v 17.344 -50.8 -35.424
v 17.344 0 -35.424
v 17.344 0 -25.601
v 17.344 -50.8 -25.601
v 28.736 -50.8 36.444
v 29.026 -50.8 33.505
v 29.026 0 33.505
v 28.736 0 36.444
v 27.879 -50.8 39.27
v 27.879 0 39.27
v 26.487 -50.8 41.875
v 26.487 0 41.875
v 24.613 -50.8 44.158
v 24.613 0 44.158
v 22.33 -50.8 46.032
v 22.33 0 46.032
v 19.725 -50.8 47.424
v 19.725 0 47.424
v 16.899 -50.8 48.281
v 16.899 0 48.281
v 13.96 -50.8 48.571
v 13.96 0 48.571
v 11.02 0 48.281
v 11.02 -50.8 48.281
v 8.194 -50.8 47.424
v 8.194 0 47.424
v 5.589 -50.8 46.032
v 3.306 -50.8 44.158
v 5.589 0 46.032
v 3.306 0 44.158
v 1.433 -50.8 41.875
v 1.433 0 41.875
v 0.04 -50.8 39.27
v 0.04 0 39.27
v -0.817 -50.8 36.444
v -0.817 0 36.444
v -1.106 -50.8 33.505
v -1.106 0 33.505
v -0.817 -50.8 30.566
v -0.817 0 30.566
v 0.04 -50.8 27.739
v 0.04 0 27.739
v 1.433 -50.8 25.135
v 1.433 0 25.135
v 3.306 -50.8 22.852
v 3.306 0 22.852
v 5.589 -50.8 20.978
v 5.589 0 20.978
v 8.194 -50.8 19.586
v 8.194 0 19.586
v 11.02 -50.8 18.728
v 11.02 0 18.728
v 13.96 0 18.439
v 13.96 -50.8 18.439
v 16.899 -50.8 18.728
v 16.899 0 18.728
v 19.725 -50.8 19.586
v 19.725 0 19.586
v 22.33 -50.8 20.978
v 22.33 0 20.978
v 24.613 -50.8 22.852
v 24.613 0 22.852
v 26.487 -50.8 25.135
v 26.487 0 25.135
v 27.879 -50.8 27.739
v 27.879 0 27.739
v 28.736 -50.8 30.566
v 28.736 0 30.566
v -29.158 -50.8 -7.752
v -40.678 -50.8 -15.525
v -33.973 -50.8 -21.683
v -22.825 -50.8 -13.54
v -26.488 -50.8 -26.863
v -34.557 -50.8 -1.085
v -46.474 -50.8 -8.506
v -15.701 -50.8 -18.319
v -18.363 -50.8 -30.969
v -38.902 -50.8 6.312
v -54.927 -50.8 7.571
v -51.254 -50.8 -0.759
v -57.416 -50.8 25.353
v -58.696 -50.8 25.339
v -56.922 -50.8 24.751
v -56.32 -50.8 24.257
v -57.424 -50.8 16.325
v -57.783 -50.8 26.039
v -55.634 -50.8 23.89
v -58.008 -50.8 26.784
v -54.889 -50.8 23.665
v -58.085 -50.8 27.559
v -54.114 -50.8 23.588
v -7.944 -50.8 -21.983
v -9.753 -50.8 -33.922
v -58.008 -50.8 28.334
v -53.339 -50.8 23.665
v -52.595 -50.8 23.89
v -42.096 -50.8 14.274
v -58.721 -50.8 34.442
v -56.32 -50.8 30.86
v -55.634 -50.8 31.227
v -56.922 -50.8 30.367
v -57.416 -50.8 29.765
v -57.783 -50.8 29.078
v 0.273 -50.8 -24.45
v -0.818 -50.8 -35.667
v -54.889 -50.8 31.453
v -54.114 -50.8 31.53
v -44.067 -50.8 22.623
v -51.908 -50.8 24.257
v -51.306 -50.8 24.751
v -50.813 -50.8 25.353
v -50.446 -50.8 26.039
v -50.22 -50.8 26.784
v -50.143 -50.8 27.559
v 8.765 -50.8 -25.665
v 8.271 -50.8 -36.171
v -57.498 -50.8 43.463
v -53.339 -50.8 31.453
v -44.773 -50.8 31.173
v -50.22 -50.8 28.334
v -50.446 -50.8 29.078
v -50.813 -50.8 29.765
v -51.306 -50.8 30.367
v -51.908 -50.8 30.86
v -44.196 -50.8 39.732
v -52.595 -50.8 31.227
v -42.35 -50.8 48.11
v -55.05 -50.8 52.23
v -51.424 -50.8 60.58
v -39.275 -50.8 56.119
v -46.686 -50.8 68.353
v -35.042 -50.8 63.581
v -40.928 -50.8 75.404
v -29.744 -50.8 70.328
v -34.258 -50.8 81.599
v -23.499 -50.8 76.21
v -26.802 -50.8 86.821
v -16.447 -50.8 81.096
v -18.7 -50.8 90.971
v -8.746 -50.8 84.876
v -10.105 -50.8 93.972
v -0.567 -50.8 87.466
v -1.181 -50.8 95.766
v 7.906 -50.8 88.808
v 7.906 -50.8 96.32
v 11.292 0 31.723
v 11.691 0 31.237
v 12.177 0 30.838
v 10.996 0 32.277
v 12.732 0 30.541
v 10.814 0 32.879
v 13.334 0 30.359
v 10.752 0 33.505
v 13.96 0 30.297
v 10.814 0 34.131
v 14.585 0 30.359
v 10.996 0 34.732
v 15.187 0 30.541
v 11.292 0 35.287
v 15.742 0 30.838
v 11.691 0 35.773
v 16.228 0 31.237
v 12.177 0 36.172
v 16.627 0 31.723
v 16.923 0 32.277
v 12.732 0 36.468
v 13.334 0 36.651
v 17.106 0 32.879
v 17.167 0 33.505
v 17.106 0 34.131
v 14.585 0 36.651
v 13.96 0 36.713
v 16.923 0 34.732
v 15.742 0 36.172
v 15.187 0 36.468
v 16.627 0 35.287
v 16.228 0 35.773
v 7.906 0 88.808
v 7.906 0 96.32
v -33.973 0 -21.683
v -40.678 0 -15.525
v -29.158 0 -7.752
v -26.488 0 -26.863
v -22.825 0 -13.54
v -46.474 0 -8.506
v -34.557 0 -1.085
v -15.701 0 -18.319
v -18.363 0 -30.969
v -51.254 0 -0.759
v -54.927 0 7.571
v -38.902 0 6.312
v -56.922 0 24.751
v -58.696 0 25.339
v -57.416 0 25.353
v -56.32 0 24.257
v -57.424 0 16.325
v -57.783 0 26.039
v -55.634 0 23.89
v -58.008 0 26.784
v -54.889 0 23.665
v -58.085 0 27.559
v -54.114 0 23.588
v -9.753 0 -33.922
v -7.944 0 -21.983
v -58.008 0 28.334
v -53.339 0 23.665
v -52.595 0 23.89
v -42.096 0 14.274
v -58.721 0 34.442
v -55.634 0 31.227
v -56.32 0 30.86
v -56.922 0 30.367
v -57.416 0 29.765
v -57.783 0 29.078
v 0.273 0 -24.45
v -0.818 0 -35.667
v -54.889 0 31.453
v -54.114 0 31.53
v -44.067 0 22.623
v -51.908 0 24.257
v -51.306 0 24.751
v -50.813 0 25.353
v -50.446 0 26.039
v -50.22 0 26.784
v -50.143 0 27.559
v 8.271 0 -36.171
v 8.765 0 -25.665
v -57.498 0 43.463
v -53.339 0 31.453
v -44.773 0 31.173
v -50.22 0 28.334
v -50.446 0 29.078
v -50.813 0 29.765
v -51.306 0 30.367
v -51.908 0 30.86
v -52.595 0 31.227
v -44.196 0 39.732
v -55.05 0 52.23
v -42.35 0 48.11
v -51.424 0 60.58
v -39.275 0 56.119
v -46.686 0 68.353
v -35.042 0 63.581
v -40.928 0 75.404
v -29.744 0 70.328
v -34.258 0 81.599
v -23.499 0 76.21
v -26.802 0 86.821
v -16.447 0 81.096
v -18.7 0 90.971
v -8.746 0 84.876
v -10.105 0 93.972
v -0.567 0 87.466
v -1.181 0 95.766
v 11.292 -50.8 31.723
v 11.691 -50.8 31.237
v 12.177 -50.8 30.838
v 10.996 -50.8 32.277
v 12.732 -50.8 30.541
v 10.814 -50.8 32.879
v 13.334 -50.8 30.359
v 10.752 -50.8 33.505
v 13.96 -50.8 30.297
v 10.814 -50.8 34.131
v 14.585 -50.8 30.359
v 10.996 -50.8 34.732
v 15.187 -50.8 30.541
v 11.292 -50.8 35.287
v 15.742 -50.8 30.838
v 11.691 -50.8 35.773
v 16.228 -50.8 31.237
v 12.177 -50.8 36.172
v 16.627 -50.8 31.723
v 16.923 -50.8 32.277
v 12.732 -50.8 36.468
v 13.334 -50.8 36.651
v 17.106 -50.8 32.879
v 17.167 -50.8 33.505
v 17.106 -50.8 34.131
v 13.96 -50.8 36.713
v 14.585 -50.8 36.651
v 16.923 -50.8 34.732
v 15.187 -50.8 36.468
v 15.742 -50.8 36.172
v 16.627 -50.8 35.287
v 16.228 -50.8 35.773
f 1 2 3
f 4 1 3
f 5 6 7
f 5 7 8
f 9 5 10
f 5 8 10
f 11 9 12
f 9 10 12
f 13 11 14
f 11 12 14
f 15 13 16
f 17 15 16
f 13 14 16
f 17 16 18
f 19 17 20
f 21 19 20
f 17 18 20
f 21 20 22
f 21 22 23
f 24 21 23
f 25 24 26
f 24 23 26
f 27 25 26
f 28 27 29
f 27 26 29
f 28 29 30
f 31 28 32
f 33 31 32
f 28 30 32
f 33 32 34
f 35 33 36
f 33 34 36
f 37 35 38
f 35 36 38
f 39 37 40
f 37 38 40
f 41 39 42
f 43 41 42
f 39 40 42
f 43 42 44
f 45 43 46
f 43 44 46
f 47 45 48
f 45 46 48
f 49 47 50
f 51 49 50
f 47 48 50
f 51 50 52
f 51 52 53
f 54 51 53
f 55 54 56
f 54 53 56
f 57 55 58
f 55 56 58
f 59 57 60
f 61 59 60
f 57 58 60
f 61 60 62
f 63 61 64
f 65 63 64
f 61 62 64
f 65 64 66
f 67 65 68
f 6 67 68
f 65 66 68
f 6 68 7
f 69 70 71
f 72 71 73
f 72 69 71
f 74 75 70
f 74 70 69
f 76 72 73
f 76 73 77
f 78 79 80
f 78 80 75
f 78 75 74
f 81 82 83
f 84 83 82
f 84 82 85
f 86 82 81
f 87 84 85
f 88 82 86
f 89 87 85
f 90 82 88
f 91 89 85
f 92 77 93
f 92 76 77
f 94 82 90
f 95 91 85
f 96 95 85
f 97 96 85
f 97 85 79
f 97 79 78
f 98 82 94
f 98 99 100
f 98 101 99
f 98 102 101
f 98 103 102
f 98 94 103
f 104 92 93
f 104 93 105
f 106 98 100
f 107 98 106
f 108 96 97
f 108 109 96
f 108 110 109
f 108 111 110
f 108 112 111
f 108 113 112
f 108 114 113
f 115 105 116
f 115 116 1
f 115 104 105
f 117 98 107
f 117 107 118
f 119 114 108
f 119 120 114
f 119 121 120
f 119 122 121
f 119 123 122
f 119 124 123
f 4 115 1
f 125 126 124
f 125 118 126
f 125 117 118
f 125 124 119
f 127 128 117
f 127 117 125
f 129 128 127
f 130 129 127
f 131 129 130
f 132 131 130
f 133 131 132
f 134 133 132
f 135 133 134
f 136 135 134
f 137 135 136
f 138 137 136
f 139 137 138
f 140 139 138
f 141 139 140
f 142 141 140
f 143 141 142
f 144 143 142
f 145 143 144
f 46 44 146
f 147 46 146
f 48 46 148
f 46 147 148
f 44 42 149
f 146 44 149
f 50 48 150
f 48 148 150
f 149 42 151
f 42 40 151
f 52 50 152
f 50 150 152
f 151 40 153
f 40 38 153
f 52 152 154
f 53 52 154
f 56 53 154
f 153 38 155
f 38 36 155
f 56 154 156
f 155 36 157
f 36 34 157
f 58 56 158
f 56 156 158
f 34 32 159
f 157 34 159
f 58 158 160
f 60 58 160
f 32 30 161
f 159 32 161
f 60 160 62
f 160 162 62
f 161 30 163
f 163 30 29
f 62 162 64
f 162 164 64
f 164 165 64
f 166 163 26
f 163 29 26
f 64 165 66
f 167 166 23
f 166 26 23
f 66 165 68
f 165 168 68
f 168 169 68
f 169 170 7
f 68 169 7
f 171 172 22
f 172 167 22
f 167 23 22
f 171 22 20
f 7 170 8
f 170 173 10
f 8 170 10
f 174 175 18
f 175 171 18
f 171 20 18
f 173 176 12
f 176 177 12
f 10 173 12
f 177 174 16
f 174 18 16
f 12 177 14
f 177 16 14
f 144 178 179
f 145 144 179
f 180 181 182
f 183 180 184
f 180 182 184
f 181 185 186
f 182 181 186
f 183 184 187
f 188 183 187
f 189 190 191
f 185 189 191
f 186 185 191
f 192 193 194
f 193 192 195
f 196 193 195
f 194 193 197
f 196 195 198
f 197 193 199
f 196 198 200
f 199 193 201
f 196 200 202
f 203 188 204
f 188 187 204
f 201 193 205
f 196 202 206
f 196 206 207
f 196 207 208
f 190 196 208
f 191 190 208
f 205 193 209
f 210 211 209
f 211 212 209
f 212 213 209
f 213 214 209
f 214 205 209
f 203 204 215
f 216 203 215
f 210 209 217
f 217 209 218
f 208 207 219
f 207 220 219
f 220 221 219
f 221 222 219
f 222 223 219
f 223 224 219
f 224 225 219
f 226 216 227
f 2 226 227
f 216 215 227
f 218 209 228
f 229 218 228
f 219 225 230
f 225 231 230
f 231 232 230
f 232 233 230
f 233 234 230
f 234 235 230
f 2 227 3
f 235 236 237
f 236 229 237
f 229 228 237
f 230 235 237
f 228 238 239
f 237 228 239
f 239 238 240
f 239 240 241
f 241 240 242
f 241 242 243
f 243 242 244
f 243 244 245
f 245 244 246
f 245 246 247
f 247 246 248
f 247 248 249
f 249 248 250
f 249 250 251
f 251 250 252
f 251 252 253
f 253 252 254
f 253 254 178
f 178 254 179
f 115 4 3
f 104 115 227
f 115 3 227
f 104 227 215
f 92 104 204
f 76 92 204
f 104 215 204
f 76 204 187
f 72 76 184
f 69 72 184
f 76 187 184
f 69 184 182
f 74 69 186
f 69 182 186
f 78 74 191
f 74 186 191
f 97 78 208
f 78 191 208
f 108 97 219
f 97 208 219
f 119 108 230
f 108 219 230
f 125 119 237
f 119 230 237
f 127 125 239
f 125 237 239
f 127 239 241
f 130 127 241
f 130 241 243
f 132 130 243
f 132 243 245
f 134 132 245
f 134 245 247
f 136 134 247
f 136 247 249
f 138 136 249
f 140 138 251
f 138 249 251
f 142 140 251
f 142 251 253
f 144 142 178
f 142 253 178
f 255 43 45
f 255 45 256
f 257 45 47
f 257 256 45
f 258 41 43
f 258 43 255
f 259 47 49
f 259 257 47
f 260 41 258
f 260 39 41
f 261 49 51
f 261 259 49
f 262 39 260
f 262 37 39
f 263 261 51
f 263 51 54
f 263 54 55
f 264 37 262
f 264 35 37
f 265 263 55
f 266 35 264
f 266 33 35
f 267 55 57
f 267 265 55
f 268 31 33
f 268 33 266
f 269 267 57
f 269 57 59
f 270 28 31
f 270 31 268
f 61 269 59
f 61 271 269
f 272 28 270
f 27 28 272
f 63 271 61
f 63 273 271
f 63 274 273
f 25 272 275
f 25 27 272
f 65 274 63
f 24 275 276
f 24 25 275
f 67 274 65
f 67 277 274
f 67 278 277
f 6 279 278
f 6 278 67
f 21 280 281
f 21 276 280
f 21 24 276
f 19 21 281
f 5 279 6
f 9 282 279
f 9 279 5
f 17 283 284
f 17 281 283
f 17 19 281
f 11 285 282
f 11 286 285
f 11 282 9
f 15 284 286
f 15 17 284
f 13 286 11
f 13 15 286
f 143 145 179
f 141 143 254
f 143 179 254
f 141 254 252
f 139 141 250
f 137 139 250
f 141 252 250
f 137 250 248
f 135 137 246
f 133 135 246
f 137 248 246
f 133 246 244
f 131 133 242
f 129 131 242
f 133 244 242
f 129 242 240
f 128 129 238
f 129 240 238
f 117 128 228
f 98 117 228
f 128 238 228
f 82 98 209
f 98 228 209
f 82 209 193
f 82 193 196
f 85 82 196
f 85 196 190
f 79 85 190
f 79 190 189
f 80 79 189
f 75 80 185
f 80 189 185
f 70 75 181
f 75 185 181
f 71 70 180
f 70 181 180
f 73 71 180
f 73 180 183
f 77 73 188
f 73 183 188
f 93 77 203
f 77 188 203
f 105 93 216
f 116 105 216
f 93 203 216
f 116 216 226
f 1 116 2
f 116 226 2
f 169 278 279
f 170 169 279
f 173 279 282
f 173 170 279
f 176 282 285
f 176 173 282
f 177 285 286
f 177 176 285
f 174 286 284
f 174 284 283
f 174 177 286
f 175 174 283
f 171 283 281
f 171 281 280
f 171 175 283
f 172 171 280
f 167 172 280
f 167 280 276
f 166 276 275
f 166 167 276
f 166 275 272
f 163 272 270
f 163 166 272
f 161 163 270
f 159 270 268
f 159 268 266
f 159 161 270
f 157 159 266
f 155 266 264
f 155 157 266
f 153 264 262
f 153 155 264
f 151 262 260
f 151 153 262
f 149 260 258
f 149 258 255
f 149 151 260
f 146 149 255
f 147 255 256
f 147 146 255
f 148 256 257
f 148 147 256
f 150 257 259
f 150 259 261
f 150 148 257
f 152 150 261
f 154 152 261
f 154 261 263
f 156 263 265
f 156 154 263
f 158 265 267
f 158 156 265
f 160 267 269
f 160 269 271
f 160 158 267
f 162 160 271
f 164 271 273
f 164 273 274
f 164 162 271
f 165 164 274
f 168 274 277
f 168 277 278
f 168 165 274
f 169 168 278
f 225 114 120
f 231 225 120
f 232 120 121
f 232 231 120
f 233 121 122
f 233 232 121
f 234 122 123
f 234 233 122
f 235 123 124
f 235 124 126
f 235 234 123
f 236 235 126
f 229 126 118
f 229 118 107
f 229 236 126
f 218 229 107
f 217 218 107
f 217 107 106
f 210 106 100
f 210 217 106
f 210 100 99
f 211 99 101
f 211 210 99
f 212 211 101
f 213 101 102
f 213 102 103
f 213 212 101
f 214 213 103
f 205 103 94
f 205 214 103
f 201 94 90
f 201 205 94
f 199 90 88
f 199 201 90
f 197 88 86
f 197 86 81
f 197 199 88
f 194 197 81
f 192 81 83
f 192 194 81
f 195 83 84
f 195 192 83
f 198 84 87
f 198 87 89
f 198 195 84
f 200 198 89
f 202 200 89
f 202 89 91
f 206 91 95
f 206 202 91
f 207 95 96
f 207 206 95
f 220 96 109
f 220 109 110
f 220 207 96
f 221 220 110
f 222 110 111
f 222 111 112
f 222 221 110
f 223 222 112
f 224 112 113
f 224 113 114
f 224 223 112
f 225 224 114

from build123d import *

# Parameters (mm, degrees)
F0_R     = 15.066095
F0_R_2   = 3.207736
F0_R_3   = 3.970722
F1_DEPTH = 50.8


with BuildPart() as f1:
    # F0 (on Front) → F1 (new body)
    with BuildSketch(Plane.XZ):
        with Locations((13.959615, 33.504877)):
            Circle(F0_R)
        with Locations((13.959615, 33.504877)):
            Circle(F0_R_2, mode=Mode.SUBTRACT)
        with BuildLine():
            ThreePointArc((17.343592, -25.600936), (-44.579953, 26.884805), (7.905788, 88.80835))
            Line((7.905788, 88.80835), (7.905788, 96.32007))
            ThreePointArc((7.905788, 96.32007), (-58.696377, 25.338798), (17.343592, -35.423957))
            Line((17.343592, -35.423957), (17.343592, -25.600936))
        make_face()
        with Locations((-54.114059, 27.558934)):
            Circle(F0_R_3, mode=Mode.SUBTRACT)
    extrude(amount=F1_DEPTH)


solid = f1.part
